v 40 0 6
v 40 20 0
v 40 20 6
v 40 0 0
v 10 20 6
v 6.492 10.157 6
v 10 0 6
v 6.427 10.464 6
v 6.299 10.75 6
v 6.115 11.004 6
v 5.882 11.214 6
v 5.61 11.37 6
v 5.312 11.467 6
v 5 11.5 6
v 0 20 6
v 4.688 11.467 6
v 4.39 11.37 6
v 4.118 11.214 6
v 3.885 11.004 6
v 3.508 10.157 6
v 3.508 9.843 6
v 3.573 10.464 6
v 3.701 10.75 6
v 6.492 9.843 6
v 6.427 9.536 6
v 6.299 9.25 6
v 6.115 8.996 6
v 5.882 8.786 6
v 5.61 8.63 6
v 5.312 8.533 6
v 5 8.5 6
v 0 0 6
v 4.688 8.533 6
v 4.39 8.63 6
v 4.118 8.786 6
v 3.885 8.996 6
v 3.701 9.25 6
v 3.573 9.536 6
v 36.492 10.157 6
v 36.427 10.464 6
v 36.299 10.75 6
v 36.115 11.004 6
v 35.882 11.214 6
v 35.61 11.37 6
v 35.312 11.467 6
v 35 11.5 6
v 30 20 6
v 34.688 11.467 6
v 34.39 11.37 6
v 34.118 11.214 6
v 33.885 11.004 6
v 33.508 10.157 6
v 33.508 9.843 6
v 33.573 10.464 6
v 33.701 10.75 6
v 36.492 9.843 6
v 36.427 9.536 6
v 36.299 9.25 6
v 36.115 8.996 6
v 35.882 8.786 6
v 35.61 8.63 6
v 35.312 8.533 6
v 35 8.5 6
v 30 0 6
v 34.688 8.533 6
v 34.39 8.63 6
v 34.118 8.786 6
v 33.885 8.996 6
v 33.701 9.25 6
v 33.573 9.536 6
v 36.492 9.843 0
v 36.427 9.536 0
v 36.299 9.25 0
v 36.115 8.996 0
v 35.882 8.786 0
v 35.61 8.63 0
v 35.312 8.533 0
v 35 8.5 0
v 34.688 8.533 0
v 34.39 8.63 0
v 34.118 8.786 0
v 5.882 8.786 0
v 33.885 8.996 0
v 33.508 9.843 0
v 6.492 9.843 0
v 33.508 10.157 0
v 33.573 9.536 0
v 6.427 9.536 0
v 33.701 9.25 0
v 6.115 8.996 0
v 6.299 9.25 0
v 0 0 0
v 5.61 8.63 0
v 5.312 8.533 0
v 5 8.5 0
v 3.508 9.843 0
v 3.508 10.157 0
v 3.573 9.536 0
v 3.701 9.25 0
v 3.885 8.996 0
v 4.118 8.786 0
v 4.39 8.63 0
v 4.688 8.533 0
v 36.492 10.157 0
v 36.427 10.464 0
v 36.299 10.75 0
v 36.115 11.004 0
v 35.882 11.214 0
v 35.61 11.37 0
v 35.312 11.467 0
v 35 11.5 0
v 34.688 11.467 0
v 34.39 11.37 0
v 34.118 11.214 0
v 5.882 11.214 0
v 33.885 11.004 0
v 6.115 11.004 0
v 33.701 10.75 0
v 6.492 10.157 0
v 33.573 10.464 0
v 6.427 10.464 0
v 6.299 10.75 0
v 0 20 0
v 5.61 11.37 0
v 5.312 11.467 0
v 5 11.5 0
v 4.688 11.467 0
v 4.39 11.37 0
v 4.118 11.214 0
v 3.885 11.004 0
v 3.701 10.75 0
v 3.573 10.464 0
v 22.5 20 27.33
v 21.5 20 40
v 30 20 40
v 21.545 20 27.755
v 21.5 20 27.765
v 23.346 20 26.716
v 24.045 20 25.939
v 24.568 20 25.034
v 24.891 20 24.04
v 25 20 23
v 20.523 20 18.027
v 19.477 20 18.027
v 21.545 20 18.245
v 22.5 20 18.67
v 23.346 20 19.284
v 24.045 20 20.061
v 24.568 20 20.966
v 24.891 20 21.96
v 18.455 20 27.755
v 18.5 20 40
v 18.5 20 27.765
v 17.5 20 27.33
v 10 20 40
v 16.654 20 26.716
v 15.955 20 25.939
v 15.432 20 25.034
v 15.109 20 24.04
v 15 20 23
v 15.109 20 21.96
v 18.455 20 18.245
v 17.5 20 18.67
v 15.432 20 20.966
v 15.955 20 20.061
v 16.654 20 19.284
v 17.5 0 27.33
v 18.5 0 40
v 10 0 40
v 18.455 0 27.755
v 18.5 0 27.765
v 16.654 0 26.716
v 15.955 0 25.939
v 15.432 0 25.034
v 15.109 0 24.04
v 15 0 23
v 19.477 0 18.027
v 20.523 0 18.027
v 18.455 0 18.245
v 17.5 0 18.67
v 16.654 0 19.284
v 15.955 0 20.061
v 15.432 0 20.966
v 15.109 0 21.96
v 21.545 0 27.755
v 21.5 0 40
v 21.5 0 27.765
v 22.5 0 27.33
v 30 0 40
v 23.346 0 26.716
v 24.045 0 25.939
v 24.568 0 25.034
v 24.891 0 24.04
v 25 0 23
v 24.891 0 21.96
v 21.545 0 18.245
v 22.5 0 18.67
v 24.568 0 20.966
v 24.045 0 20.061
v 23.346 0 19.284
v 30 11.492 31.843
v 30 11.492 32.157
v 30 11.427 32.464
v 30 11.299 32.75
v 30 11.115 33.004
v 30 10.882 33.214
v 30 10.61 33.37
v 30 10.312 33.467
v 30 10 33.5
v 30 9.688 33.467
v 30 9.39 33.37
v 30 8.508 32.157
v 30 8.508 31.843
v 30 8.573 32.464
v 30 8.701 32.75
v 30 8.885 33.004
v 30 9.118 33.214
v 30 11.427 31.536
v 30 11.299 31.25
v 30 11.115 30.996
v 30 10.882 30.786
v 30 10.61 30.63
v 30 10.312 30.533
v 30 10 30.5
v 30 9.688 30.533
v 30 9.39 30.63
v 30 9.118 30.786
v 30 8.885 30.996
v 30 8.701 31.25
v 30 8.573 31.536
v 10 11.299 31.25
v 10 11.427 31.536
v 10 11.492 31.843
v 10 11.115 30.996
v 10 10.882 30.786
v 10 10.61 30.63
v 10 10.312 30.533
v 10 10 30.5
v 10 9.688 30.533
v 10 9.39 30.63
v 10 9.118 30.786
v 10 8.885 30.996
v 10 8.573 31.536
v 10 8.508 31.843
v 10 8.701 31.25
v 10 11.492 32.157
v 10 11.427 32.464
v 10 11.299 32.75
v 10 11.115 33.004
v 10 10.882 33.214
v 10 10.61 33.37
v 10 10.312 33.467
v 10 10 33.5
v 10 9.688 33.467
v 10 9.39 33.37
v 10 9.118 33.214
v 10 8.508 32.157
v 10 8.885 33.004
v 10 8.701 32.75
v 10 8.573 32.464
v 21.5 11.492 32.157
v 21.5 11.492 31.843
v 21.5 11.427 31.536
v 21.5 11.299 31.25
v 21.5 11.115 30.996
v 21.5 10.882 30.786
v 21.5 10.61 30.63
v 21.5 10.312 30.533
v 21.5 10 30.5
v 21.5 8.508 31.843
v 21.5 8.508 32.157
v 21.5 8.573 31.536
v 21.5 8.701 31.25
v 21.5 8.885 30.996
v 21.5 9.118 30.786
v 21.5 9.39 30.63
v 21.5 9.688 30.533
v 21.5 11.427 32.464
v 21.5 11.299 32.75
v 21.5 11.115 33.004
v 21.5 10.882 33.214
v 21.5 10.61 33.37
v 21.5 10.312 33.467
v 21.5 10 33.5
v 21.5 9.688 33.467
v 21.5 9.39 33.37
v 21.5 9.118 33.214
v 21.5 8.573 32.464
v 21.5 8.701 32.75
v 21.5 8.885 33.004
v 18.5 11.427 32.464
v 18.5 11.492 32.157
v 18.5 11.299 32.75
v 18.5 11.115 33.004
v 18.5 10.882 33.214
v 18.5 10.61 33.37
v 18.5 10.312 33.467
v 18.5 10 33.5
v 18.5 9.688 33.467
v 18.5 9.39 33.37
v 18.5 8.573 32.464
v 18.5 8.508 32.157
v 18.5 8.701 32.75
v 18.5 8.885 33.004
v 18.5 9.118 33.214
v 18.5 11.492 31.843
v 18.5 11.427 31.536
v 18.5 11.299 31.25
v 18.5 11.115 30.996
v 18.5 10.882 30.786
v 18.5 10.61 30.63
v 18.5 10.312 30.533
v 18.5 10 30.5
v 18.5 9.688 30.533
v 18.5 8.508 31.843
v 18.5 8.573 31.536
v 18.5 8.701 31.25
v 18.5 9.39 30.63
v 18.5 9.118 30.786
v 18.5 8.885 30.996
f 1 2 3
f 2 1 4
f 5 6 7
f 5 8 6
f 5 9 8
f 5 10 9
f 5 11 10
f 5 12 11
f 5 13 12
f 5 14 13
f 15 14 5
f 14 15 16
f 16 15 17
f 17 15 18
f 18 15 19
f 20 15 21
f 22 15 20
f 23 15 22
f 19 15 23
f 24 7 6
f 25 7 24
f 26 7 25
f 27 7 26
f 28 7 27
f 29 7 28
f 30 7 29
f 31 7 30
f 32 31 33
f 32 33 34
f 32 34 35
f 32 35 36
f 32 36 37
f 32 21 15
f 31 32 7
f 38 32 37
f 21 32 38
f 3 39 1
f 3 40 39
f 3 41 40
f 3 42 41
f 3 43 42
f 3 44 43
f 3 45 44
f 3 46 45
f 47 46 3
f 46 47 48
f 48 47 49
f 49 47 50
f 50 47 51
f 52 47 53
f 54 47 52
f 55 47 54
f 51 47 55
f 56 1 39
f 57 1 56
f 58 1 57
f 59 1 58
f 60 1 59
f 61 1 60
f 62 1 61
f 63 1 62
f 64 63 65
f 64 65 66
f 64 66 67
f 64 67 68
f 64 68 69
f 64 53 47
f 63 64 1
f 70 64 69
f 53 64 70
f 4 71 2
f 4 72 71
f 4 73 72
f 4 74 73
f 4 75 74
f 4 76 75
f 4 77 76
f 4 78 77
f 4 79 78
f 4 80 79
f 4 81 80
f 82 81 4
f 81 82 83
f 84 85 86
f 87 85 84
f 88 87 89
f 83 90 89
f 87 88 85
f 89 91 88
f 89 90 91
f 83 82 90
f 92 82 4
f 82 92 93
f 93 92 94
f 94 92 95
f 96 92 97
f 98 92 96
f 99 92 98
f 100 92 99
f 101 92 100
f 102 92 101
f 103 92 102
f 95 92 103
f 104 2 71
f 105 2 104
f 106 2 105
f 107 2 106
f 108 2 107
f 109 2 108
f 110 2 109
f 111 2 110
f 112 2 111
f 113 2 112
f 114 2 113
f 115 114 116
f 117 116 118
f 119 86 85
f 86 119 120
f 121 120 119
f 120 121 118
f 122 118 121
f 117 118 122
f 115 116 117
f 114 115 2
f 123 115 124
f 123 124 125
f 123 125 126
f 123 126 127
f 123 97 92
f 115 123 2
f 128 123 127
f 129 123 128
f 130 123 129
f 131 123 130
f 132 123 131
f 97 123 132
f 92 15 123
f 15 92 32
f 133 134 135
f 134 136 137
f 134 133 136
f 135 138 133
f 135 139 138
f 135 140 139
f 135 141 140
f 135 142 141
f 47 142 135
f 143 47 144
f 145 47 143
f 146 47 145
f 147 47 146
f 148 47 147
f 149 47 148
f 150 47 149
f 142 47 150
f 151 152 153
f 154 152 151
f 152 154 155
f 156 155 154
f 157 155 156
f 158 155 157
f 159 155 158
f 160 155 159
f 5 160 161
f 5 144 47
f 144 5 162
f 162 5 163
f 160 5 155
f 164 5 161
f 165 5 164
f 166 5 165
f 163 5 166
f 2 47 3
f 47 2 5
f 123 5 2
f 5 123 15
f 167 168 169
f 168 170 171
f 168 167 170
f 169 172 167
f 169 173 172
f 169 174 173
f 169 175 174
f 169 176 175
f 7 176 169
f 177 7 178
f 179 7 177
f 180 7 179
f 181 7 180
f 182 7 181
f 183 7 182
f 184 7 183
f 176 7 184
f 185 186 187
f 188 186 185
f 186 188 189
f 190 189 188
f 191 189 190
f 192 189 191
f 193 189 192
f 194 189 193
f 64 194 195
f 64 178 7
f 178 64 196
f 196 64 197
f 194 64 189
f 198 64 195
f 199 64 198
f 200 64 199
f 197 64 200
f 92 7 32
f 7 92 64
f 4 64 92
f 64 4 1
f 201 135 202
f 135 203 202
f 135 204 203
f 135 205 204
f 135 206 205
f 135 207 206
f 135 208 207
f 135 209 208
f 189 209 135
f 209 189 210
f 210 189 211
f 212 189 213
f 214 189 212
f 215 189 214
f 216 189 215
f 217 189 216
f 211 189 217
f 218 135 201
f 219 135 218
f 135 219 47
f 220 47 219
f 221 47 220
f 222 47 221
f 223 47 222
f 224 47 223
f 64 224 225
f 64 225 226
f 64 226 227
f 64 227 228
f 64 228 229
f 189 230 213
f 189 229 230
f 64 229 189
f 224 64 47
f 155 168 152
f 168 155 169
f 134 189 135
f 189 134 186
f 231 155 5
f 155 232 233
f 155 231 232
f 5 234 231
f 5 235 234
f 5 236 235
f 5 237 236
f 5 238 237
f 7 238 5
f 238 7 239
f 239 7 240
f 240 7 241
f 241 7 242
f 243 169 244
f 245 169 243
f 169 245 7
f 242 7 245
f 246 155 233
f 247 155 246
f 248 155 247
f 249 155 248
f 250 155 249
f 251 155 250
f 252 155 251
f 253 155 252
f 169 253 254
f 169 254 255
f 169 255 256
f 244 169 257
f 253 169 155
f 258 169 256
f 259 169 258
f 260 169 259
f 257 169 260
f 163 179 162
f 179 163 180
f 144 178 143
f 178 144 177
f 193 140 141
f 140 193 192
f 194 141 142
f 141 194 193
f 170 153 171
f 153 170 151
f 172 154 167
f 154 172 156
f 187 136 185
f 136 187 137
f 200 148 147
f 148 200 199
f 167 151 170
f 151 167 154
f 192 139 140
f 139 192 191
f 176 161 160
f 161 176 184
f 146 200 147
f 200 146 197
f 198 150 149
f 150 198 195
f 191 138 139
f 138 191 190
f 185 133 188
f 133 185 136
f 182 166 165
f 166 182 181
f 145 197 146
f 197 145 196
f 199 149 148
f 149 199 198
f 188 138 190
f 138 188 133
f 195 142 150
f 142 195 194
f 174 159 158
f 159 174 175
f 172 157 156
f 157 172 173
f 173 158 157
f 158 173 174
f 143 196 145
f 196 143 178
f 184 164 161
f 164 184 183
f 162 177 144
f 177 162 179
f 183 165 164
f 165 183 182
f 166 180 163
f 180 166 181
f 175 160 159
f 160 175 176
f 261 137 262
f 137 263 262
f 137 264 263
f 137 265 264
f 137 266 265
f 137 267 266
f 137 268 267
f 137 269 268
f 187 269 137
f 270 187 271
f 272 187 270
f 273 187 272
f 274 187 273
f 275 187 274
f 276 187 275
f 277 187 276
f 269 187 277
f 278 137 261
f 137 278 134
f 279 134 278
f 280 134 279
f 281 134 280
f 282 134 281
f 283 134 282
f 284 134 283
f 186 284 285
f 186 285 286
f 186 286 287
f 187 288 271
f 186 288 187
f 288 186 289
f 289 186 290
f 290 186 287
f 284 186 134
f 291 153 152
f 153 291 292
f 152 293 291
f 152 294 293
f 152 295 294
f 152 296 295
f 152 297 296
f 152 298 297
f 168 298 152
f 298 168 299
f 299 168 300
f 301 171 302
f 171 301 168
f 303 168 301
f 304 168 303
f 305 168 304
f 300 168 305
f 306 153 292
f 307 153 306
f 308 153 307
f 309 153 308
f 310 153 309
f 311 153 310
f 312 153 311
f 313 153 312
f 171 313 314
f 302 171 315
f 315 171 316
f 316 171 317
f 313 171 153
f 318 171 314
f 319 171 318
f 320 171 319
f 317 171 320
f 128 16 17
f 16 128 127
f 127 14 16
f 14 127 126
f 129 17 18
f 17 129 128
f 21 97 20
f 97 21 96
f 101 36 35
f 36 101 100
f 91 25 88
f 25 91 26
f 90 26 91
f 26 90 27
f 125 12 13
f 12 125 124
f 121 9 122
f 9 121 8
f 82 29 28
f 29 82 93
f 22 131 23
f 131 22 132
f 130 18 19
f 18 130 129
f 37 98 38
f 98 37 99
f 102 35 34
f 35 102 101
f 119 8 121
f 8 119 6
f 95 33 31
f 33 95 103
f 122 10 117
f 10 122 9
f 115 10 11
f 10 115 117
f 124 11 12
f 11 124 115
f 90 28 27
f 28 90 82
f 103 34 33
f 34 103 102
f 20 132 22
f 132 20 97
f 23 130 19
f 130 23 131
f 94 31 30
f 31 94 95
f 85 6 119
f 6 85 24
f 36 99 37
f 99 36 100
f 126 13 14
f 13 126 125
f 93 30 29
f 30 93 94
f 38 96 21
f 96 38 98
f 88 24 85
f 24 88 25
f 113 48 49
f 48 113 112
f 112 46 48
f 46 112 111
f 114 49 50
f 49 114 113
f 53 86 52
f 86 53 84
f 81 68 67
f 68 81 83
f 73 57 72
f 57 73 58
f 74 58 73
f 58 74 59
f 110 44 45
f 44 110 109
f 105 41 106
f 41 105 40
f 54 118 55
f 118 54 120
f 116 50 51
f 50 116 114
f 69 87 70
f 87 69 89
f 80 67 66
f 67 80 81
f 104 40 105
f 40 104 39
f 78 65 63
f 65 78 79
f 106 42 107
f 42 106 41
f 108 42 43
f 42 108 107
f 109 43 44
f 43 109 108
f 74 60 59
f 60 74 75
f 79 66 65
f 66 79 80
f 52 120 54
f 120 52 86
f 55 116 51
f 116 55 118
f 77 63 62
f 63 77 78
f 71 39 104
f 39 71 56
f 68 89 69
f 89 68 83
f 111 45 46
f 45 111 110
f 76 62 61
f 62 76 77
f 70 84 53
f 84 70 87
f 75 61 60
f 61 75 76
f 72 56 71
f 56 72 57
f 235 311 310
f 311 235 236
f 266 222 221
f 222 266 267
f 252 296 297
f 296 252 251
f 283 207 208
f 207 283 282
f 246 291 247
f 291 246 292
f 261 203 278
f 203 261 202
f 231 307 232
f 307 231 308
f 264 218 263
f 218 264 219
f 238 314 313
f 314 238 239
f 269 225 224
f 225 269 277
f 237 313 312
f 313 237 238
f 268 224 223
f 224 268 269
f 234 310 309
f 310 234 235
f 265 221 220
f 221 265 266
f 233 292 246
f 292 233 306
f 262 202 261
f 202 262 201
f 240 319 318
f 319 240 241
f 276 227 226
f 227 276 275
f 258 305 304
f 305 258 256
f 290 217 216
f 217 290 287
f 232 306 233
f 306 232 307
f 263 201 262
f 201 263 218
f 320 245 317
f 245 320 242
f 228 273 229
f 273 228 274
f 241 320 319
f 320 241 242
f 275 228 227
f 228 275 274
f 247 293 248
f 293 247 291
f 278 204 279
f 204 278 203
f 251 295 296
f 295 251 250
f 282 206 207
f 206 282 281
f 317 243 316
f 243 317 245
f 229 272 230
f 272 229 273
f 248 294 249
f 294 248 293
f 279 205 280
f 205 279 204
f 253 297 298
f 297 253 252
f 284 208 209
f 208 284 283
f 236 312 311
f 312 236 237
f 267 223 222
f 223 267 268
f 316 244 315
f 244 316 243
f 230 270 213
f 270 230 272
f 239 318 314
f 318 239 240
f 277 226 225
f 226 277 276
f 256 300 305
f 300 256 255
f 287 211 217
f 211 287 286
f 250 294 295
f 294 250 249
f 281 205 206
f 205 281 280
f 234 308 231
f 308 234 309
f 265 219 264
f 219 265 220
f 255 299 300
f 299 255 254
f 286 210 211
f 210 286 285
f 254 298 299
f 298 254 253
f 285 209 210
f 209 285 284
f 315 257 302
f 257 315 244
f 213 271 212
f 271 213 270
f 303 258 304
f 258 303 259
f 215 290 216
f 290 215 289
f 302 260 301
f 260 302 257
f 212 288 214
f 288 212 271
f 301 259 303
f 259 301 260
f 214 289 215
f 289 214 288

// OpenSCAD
$fn=30; //number of fragments
Width=40;
Depth=20;
BaseHeight=6;    
TopWidth=20;
TopGap=3;
Height=40;
RodDiameter=10;



module Base_SK(Width,Depth,BaseHeight,TopWidth,Height)
{
    
cube([Width,Depth,BaseHeight]);
translate([(Width/2-TopWidth/2),0,BaseHeight])
    cube([TopWidth,Depth,Height-BaseHeight]);
}


difference()
{
    difference()
    {
        difference()
        {
            difference()
            {
                difference()
                {
                Base_SK(Width,Depth,BaseHeight,TopWidth,Height);
                translate([(Width/2-TopWidth/2)+TopWidth/2,Depth,Height/2+3])
                    rotate(90, [ 1, 0, 0 ])
                        cylinder(h=Depth+1,r=RodDiameter/2);
                }
                translate([Width/2-TopGap/2,0,Height/2+5]) // Rod Hole Gap 
                    cube([TopGap,Depth,15]);
            }
            translate([(Width-TopWidth)/4,Depth/2,0]) //Left base hole
                rotate(90, [ 0, 0, 1 ])
                    cylinder(h=BaseHeight+5,r=1.5);     
        }
        translate([Width-(Width-TopWidth)/4,Depth/2,0]) //Right base hole
            rotate(90, [ 0, 0, 1 ])
                cylinder(h=BaseHeight+5,r=1.5);
    }
    translate([0,Depth/2,Height-Height/5]) //Rod Hole
        rotate(90, [ 0, 1, 0 ])
            cylinder(h=BaseHeight+25,r=1.5);   
}
